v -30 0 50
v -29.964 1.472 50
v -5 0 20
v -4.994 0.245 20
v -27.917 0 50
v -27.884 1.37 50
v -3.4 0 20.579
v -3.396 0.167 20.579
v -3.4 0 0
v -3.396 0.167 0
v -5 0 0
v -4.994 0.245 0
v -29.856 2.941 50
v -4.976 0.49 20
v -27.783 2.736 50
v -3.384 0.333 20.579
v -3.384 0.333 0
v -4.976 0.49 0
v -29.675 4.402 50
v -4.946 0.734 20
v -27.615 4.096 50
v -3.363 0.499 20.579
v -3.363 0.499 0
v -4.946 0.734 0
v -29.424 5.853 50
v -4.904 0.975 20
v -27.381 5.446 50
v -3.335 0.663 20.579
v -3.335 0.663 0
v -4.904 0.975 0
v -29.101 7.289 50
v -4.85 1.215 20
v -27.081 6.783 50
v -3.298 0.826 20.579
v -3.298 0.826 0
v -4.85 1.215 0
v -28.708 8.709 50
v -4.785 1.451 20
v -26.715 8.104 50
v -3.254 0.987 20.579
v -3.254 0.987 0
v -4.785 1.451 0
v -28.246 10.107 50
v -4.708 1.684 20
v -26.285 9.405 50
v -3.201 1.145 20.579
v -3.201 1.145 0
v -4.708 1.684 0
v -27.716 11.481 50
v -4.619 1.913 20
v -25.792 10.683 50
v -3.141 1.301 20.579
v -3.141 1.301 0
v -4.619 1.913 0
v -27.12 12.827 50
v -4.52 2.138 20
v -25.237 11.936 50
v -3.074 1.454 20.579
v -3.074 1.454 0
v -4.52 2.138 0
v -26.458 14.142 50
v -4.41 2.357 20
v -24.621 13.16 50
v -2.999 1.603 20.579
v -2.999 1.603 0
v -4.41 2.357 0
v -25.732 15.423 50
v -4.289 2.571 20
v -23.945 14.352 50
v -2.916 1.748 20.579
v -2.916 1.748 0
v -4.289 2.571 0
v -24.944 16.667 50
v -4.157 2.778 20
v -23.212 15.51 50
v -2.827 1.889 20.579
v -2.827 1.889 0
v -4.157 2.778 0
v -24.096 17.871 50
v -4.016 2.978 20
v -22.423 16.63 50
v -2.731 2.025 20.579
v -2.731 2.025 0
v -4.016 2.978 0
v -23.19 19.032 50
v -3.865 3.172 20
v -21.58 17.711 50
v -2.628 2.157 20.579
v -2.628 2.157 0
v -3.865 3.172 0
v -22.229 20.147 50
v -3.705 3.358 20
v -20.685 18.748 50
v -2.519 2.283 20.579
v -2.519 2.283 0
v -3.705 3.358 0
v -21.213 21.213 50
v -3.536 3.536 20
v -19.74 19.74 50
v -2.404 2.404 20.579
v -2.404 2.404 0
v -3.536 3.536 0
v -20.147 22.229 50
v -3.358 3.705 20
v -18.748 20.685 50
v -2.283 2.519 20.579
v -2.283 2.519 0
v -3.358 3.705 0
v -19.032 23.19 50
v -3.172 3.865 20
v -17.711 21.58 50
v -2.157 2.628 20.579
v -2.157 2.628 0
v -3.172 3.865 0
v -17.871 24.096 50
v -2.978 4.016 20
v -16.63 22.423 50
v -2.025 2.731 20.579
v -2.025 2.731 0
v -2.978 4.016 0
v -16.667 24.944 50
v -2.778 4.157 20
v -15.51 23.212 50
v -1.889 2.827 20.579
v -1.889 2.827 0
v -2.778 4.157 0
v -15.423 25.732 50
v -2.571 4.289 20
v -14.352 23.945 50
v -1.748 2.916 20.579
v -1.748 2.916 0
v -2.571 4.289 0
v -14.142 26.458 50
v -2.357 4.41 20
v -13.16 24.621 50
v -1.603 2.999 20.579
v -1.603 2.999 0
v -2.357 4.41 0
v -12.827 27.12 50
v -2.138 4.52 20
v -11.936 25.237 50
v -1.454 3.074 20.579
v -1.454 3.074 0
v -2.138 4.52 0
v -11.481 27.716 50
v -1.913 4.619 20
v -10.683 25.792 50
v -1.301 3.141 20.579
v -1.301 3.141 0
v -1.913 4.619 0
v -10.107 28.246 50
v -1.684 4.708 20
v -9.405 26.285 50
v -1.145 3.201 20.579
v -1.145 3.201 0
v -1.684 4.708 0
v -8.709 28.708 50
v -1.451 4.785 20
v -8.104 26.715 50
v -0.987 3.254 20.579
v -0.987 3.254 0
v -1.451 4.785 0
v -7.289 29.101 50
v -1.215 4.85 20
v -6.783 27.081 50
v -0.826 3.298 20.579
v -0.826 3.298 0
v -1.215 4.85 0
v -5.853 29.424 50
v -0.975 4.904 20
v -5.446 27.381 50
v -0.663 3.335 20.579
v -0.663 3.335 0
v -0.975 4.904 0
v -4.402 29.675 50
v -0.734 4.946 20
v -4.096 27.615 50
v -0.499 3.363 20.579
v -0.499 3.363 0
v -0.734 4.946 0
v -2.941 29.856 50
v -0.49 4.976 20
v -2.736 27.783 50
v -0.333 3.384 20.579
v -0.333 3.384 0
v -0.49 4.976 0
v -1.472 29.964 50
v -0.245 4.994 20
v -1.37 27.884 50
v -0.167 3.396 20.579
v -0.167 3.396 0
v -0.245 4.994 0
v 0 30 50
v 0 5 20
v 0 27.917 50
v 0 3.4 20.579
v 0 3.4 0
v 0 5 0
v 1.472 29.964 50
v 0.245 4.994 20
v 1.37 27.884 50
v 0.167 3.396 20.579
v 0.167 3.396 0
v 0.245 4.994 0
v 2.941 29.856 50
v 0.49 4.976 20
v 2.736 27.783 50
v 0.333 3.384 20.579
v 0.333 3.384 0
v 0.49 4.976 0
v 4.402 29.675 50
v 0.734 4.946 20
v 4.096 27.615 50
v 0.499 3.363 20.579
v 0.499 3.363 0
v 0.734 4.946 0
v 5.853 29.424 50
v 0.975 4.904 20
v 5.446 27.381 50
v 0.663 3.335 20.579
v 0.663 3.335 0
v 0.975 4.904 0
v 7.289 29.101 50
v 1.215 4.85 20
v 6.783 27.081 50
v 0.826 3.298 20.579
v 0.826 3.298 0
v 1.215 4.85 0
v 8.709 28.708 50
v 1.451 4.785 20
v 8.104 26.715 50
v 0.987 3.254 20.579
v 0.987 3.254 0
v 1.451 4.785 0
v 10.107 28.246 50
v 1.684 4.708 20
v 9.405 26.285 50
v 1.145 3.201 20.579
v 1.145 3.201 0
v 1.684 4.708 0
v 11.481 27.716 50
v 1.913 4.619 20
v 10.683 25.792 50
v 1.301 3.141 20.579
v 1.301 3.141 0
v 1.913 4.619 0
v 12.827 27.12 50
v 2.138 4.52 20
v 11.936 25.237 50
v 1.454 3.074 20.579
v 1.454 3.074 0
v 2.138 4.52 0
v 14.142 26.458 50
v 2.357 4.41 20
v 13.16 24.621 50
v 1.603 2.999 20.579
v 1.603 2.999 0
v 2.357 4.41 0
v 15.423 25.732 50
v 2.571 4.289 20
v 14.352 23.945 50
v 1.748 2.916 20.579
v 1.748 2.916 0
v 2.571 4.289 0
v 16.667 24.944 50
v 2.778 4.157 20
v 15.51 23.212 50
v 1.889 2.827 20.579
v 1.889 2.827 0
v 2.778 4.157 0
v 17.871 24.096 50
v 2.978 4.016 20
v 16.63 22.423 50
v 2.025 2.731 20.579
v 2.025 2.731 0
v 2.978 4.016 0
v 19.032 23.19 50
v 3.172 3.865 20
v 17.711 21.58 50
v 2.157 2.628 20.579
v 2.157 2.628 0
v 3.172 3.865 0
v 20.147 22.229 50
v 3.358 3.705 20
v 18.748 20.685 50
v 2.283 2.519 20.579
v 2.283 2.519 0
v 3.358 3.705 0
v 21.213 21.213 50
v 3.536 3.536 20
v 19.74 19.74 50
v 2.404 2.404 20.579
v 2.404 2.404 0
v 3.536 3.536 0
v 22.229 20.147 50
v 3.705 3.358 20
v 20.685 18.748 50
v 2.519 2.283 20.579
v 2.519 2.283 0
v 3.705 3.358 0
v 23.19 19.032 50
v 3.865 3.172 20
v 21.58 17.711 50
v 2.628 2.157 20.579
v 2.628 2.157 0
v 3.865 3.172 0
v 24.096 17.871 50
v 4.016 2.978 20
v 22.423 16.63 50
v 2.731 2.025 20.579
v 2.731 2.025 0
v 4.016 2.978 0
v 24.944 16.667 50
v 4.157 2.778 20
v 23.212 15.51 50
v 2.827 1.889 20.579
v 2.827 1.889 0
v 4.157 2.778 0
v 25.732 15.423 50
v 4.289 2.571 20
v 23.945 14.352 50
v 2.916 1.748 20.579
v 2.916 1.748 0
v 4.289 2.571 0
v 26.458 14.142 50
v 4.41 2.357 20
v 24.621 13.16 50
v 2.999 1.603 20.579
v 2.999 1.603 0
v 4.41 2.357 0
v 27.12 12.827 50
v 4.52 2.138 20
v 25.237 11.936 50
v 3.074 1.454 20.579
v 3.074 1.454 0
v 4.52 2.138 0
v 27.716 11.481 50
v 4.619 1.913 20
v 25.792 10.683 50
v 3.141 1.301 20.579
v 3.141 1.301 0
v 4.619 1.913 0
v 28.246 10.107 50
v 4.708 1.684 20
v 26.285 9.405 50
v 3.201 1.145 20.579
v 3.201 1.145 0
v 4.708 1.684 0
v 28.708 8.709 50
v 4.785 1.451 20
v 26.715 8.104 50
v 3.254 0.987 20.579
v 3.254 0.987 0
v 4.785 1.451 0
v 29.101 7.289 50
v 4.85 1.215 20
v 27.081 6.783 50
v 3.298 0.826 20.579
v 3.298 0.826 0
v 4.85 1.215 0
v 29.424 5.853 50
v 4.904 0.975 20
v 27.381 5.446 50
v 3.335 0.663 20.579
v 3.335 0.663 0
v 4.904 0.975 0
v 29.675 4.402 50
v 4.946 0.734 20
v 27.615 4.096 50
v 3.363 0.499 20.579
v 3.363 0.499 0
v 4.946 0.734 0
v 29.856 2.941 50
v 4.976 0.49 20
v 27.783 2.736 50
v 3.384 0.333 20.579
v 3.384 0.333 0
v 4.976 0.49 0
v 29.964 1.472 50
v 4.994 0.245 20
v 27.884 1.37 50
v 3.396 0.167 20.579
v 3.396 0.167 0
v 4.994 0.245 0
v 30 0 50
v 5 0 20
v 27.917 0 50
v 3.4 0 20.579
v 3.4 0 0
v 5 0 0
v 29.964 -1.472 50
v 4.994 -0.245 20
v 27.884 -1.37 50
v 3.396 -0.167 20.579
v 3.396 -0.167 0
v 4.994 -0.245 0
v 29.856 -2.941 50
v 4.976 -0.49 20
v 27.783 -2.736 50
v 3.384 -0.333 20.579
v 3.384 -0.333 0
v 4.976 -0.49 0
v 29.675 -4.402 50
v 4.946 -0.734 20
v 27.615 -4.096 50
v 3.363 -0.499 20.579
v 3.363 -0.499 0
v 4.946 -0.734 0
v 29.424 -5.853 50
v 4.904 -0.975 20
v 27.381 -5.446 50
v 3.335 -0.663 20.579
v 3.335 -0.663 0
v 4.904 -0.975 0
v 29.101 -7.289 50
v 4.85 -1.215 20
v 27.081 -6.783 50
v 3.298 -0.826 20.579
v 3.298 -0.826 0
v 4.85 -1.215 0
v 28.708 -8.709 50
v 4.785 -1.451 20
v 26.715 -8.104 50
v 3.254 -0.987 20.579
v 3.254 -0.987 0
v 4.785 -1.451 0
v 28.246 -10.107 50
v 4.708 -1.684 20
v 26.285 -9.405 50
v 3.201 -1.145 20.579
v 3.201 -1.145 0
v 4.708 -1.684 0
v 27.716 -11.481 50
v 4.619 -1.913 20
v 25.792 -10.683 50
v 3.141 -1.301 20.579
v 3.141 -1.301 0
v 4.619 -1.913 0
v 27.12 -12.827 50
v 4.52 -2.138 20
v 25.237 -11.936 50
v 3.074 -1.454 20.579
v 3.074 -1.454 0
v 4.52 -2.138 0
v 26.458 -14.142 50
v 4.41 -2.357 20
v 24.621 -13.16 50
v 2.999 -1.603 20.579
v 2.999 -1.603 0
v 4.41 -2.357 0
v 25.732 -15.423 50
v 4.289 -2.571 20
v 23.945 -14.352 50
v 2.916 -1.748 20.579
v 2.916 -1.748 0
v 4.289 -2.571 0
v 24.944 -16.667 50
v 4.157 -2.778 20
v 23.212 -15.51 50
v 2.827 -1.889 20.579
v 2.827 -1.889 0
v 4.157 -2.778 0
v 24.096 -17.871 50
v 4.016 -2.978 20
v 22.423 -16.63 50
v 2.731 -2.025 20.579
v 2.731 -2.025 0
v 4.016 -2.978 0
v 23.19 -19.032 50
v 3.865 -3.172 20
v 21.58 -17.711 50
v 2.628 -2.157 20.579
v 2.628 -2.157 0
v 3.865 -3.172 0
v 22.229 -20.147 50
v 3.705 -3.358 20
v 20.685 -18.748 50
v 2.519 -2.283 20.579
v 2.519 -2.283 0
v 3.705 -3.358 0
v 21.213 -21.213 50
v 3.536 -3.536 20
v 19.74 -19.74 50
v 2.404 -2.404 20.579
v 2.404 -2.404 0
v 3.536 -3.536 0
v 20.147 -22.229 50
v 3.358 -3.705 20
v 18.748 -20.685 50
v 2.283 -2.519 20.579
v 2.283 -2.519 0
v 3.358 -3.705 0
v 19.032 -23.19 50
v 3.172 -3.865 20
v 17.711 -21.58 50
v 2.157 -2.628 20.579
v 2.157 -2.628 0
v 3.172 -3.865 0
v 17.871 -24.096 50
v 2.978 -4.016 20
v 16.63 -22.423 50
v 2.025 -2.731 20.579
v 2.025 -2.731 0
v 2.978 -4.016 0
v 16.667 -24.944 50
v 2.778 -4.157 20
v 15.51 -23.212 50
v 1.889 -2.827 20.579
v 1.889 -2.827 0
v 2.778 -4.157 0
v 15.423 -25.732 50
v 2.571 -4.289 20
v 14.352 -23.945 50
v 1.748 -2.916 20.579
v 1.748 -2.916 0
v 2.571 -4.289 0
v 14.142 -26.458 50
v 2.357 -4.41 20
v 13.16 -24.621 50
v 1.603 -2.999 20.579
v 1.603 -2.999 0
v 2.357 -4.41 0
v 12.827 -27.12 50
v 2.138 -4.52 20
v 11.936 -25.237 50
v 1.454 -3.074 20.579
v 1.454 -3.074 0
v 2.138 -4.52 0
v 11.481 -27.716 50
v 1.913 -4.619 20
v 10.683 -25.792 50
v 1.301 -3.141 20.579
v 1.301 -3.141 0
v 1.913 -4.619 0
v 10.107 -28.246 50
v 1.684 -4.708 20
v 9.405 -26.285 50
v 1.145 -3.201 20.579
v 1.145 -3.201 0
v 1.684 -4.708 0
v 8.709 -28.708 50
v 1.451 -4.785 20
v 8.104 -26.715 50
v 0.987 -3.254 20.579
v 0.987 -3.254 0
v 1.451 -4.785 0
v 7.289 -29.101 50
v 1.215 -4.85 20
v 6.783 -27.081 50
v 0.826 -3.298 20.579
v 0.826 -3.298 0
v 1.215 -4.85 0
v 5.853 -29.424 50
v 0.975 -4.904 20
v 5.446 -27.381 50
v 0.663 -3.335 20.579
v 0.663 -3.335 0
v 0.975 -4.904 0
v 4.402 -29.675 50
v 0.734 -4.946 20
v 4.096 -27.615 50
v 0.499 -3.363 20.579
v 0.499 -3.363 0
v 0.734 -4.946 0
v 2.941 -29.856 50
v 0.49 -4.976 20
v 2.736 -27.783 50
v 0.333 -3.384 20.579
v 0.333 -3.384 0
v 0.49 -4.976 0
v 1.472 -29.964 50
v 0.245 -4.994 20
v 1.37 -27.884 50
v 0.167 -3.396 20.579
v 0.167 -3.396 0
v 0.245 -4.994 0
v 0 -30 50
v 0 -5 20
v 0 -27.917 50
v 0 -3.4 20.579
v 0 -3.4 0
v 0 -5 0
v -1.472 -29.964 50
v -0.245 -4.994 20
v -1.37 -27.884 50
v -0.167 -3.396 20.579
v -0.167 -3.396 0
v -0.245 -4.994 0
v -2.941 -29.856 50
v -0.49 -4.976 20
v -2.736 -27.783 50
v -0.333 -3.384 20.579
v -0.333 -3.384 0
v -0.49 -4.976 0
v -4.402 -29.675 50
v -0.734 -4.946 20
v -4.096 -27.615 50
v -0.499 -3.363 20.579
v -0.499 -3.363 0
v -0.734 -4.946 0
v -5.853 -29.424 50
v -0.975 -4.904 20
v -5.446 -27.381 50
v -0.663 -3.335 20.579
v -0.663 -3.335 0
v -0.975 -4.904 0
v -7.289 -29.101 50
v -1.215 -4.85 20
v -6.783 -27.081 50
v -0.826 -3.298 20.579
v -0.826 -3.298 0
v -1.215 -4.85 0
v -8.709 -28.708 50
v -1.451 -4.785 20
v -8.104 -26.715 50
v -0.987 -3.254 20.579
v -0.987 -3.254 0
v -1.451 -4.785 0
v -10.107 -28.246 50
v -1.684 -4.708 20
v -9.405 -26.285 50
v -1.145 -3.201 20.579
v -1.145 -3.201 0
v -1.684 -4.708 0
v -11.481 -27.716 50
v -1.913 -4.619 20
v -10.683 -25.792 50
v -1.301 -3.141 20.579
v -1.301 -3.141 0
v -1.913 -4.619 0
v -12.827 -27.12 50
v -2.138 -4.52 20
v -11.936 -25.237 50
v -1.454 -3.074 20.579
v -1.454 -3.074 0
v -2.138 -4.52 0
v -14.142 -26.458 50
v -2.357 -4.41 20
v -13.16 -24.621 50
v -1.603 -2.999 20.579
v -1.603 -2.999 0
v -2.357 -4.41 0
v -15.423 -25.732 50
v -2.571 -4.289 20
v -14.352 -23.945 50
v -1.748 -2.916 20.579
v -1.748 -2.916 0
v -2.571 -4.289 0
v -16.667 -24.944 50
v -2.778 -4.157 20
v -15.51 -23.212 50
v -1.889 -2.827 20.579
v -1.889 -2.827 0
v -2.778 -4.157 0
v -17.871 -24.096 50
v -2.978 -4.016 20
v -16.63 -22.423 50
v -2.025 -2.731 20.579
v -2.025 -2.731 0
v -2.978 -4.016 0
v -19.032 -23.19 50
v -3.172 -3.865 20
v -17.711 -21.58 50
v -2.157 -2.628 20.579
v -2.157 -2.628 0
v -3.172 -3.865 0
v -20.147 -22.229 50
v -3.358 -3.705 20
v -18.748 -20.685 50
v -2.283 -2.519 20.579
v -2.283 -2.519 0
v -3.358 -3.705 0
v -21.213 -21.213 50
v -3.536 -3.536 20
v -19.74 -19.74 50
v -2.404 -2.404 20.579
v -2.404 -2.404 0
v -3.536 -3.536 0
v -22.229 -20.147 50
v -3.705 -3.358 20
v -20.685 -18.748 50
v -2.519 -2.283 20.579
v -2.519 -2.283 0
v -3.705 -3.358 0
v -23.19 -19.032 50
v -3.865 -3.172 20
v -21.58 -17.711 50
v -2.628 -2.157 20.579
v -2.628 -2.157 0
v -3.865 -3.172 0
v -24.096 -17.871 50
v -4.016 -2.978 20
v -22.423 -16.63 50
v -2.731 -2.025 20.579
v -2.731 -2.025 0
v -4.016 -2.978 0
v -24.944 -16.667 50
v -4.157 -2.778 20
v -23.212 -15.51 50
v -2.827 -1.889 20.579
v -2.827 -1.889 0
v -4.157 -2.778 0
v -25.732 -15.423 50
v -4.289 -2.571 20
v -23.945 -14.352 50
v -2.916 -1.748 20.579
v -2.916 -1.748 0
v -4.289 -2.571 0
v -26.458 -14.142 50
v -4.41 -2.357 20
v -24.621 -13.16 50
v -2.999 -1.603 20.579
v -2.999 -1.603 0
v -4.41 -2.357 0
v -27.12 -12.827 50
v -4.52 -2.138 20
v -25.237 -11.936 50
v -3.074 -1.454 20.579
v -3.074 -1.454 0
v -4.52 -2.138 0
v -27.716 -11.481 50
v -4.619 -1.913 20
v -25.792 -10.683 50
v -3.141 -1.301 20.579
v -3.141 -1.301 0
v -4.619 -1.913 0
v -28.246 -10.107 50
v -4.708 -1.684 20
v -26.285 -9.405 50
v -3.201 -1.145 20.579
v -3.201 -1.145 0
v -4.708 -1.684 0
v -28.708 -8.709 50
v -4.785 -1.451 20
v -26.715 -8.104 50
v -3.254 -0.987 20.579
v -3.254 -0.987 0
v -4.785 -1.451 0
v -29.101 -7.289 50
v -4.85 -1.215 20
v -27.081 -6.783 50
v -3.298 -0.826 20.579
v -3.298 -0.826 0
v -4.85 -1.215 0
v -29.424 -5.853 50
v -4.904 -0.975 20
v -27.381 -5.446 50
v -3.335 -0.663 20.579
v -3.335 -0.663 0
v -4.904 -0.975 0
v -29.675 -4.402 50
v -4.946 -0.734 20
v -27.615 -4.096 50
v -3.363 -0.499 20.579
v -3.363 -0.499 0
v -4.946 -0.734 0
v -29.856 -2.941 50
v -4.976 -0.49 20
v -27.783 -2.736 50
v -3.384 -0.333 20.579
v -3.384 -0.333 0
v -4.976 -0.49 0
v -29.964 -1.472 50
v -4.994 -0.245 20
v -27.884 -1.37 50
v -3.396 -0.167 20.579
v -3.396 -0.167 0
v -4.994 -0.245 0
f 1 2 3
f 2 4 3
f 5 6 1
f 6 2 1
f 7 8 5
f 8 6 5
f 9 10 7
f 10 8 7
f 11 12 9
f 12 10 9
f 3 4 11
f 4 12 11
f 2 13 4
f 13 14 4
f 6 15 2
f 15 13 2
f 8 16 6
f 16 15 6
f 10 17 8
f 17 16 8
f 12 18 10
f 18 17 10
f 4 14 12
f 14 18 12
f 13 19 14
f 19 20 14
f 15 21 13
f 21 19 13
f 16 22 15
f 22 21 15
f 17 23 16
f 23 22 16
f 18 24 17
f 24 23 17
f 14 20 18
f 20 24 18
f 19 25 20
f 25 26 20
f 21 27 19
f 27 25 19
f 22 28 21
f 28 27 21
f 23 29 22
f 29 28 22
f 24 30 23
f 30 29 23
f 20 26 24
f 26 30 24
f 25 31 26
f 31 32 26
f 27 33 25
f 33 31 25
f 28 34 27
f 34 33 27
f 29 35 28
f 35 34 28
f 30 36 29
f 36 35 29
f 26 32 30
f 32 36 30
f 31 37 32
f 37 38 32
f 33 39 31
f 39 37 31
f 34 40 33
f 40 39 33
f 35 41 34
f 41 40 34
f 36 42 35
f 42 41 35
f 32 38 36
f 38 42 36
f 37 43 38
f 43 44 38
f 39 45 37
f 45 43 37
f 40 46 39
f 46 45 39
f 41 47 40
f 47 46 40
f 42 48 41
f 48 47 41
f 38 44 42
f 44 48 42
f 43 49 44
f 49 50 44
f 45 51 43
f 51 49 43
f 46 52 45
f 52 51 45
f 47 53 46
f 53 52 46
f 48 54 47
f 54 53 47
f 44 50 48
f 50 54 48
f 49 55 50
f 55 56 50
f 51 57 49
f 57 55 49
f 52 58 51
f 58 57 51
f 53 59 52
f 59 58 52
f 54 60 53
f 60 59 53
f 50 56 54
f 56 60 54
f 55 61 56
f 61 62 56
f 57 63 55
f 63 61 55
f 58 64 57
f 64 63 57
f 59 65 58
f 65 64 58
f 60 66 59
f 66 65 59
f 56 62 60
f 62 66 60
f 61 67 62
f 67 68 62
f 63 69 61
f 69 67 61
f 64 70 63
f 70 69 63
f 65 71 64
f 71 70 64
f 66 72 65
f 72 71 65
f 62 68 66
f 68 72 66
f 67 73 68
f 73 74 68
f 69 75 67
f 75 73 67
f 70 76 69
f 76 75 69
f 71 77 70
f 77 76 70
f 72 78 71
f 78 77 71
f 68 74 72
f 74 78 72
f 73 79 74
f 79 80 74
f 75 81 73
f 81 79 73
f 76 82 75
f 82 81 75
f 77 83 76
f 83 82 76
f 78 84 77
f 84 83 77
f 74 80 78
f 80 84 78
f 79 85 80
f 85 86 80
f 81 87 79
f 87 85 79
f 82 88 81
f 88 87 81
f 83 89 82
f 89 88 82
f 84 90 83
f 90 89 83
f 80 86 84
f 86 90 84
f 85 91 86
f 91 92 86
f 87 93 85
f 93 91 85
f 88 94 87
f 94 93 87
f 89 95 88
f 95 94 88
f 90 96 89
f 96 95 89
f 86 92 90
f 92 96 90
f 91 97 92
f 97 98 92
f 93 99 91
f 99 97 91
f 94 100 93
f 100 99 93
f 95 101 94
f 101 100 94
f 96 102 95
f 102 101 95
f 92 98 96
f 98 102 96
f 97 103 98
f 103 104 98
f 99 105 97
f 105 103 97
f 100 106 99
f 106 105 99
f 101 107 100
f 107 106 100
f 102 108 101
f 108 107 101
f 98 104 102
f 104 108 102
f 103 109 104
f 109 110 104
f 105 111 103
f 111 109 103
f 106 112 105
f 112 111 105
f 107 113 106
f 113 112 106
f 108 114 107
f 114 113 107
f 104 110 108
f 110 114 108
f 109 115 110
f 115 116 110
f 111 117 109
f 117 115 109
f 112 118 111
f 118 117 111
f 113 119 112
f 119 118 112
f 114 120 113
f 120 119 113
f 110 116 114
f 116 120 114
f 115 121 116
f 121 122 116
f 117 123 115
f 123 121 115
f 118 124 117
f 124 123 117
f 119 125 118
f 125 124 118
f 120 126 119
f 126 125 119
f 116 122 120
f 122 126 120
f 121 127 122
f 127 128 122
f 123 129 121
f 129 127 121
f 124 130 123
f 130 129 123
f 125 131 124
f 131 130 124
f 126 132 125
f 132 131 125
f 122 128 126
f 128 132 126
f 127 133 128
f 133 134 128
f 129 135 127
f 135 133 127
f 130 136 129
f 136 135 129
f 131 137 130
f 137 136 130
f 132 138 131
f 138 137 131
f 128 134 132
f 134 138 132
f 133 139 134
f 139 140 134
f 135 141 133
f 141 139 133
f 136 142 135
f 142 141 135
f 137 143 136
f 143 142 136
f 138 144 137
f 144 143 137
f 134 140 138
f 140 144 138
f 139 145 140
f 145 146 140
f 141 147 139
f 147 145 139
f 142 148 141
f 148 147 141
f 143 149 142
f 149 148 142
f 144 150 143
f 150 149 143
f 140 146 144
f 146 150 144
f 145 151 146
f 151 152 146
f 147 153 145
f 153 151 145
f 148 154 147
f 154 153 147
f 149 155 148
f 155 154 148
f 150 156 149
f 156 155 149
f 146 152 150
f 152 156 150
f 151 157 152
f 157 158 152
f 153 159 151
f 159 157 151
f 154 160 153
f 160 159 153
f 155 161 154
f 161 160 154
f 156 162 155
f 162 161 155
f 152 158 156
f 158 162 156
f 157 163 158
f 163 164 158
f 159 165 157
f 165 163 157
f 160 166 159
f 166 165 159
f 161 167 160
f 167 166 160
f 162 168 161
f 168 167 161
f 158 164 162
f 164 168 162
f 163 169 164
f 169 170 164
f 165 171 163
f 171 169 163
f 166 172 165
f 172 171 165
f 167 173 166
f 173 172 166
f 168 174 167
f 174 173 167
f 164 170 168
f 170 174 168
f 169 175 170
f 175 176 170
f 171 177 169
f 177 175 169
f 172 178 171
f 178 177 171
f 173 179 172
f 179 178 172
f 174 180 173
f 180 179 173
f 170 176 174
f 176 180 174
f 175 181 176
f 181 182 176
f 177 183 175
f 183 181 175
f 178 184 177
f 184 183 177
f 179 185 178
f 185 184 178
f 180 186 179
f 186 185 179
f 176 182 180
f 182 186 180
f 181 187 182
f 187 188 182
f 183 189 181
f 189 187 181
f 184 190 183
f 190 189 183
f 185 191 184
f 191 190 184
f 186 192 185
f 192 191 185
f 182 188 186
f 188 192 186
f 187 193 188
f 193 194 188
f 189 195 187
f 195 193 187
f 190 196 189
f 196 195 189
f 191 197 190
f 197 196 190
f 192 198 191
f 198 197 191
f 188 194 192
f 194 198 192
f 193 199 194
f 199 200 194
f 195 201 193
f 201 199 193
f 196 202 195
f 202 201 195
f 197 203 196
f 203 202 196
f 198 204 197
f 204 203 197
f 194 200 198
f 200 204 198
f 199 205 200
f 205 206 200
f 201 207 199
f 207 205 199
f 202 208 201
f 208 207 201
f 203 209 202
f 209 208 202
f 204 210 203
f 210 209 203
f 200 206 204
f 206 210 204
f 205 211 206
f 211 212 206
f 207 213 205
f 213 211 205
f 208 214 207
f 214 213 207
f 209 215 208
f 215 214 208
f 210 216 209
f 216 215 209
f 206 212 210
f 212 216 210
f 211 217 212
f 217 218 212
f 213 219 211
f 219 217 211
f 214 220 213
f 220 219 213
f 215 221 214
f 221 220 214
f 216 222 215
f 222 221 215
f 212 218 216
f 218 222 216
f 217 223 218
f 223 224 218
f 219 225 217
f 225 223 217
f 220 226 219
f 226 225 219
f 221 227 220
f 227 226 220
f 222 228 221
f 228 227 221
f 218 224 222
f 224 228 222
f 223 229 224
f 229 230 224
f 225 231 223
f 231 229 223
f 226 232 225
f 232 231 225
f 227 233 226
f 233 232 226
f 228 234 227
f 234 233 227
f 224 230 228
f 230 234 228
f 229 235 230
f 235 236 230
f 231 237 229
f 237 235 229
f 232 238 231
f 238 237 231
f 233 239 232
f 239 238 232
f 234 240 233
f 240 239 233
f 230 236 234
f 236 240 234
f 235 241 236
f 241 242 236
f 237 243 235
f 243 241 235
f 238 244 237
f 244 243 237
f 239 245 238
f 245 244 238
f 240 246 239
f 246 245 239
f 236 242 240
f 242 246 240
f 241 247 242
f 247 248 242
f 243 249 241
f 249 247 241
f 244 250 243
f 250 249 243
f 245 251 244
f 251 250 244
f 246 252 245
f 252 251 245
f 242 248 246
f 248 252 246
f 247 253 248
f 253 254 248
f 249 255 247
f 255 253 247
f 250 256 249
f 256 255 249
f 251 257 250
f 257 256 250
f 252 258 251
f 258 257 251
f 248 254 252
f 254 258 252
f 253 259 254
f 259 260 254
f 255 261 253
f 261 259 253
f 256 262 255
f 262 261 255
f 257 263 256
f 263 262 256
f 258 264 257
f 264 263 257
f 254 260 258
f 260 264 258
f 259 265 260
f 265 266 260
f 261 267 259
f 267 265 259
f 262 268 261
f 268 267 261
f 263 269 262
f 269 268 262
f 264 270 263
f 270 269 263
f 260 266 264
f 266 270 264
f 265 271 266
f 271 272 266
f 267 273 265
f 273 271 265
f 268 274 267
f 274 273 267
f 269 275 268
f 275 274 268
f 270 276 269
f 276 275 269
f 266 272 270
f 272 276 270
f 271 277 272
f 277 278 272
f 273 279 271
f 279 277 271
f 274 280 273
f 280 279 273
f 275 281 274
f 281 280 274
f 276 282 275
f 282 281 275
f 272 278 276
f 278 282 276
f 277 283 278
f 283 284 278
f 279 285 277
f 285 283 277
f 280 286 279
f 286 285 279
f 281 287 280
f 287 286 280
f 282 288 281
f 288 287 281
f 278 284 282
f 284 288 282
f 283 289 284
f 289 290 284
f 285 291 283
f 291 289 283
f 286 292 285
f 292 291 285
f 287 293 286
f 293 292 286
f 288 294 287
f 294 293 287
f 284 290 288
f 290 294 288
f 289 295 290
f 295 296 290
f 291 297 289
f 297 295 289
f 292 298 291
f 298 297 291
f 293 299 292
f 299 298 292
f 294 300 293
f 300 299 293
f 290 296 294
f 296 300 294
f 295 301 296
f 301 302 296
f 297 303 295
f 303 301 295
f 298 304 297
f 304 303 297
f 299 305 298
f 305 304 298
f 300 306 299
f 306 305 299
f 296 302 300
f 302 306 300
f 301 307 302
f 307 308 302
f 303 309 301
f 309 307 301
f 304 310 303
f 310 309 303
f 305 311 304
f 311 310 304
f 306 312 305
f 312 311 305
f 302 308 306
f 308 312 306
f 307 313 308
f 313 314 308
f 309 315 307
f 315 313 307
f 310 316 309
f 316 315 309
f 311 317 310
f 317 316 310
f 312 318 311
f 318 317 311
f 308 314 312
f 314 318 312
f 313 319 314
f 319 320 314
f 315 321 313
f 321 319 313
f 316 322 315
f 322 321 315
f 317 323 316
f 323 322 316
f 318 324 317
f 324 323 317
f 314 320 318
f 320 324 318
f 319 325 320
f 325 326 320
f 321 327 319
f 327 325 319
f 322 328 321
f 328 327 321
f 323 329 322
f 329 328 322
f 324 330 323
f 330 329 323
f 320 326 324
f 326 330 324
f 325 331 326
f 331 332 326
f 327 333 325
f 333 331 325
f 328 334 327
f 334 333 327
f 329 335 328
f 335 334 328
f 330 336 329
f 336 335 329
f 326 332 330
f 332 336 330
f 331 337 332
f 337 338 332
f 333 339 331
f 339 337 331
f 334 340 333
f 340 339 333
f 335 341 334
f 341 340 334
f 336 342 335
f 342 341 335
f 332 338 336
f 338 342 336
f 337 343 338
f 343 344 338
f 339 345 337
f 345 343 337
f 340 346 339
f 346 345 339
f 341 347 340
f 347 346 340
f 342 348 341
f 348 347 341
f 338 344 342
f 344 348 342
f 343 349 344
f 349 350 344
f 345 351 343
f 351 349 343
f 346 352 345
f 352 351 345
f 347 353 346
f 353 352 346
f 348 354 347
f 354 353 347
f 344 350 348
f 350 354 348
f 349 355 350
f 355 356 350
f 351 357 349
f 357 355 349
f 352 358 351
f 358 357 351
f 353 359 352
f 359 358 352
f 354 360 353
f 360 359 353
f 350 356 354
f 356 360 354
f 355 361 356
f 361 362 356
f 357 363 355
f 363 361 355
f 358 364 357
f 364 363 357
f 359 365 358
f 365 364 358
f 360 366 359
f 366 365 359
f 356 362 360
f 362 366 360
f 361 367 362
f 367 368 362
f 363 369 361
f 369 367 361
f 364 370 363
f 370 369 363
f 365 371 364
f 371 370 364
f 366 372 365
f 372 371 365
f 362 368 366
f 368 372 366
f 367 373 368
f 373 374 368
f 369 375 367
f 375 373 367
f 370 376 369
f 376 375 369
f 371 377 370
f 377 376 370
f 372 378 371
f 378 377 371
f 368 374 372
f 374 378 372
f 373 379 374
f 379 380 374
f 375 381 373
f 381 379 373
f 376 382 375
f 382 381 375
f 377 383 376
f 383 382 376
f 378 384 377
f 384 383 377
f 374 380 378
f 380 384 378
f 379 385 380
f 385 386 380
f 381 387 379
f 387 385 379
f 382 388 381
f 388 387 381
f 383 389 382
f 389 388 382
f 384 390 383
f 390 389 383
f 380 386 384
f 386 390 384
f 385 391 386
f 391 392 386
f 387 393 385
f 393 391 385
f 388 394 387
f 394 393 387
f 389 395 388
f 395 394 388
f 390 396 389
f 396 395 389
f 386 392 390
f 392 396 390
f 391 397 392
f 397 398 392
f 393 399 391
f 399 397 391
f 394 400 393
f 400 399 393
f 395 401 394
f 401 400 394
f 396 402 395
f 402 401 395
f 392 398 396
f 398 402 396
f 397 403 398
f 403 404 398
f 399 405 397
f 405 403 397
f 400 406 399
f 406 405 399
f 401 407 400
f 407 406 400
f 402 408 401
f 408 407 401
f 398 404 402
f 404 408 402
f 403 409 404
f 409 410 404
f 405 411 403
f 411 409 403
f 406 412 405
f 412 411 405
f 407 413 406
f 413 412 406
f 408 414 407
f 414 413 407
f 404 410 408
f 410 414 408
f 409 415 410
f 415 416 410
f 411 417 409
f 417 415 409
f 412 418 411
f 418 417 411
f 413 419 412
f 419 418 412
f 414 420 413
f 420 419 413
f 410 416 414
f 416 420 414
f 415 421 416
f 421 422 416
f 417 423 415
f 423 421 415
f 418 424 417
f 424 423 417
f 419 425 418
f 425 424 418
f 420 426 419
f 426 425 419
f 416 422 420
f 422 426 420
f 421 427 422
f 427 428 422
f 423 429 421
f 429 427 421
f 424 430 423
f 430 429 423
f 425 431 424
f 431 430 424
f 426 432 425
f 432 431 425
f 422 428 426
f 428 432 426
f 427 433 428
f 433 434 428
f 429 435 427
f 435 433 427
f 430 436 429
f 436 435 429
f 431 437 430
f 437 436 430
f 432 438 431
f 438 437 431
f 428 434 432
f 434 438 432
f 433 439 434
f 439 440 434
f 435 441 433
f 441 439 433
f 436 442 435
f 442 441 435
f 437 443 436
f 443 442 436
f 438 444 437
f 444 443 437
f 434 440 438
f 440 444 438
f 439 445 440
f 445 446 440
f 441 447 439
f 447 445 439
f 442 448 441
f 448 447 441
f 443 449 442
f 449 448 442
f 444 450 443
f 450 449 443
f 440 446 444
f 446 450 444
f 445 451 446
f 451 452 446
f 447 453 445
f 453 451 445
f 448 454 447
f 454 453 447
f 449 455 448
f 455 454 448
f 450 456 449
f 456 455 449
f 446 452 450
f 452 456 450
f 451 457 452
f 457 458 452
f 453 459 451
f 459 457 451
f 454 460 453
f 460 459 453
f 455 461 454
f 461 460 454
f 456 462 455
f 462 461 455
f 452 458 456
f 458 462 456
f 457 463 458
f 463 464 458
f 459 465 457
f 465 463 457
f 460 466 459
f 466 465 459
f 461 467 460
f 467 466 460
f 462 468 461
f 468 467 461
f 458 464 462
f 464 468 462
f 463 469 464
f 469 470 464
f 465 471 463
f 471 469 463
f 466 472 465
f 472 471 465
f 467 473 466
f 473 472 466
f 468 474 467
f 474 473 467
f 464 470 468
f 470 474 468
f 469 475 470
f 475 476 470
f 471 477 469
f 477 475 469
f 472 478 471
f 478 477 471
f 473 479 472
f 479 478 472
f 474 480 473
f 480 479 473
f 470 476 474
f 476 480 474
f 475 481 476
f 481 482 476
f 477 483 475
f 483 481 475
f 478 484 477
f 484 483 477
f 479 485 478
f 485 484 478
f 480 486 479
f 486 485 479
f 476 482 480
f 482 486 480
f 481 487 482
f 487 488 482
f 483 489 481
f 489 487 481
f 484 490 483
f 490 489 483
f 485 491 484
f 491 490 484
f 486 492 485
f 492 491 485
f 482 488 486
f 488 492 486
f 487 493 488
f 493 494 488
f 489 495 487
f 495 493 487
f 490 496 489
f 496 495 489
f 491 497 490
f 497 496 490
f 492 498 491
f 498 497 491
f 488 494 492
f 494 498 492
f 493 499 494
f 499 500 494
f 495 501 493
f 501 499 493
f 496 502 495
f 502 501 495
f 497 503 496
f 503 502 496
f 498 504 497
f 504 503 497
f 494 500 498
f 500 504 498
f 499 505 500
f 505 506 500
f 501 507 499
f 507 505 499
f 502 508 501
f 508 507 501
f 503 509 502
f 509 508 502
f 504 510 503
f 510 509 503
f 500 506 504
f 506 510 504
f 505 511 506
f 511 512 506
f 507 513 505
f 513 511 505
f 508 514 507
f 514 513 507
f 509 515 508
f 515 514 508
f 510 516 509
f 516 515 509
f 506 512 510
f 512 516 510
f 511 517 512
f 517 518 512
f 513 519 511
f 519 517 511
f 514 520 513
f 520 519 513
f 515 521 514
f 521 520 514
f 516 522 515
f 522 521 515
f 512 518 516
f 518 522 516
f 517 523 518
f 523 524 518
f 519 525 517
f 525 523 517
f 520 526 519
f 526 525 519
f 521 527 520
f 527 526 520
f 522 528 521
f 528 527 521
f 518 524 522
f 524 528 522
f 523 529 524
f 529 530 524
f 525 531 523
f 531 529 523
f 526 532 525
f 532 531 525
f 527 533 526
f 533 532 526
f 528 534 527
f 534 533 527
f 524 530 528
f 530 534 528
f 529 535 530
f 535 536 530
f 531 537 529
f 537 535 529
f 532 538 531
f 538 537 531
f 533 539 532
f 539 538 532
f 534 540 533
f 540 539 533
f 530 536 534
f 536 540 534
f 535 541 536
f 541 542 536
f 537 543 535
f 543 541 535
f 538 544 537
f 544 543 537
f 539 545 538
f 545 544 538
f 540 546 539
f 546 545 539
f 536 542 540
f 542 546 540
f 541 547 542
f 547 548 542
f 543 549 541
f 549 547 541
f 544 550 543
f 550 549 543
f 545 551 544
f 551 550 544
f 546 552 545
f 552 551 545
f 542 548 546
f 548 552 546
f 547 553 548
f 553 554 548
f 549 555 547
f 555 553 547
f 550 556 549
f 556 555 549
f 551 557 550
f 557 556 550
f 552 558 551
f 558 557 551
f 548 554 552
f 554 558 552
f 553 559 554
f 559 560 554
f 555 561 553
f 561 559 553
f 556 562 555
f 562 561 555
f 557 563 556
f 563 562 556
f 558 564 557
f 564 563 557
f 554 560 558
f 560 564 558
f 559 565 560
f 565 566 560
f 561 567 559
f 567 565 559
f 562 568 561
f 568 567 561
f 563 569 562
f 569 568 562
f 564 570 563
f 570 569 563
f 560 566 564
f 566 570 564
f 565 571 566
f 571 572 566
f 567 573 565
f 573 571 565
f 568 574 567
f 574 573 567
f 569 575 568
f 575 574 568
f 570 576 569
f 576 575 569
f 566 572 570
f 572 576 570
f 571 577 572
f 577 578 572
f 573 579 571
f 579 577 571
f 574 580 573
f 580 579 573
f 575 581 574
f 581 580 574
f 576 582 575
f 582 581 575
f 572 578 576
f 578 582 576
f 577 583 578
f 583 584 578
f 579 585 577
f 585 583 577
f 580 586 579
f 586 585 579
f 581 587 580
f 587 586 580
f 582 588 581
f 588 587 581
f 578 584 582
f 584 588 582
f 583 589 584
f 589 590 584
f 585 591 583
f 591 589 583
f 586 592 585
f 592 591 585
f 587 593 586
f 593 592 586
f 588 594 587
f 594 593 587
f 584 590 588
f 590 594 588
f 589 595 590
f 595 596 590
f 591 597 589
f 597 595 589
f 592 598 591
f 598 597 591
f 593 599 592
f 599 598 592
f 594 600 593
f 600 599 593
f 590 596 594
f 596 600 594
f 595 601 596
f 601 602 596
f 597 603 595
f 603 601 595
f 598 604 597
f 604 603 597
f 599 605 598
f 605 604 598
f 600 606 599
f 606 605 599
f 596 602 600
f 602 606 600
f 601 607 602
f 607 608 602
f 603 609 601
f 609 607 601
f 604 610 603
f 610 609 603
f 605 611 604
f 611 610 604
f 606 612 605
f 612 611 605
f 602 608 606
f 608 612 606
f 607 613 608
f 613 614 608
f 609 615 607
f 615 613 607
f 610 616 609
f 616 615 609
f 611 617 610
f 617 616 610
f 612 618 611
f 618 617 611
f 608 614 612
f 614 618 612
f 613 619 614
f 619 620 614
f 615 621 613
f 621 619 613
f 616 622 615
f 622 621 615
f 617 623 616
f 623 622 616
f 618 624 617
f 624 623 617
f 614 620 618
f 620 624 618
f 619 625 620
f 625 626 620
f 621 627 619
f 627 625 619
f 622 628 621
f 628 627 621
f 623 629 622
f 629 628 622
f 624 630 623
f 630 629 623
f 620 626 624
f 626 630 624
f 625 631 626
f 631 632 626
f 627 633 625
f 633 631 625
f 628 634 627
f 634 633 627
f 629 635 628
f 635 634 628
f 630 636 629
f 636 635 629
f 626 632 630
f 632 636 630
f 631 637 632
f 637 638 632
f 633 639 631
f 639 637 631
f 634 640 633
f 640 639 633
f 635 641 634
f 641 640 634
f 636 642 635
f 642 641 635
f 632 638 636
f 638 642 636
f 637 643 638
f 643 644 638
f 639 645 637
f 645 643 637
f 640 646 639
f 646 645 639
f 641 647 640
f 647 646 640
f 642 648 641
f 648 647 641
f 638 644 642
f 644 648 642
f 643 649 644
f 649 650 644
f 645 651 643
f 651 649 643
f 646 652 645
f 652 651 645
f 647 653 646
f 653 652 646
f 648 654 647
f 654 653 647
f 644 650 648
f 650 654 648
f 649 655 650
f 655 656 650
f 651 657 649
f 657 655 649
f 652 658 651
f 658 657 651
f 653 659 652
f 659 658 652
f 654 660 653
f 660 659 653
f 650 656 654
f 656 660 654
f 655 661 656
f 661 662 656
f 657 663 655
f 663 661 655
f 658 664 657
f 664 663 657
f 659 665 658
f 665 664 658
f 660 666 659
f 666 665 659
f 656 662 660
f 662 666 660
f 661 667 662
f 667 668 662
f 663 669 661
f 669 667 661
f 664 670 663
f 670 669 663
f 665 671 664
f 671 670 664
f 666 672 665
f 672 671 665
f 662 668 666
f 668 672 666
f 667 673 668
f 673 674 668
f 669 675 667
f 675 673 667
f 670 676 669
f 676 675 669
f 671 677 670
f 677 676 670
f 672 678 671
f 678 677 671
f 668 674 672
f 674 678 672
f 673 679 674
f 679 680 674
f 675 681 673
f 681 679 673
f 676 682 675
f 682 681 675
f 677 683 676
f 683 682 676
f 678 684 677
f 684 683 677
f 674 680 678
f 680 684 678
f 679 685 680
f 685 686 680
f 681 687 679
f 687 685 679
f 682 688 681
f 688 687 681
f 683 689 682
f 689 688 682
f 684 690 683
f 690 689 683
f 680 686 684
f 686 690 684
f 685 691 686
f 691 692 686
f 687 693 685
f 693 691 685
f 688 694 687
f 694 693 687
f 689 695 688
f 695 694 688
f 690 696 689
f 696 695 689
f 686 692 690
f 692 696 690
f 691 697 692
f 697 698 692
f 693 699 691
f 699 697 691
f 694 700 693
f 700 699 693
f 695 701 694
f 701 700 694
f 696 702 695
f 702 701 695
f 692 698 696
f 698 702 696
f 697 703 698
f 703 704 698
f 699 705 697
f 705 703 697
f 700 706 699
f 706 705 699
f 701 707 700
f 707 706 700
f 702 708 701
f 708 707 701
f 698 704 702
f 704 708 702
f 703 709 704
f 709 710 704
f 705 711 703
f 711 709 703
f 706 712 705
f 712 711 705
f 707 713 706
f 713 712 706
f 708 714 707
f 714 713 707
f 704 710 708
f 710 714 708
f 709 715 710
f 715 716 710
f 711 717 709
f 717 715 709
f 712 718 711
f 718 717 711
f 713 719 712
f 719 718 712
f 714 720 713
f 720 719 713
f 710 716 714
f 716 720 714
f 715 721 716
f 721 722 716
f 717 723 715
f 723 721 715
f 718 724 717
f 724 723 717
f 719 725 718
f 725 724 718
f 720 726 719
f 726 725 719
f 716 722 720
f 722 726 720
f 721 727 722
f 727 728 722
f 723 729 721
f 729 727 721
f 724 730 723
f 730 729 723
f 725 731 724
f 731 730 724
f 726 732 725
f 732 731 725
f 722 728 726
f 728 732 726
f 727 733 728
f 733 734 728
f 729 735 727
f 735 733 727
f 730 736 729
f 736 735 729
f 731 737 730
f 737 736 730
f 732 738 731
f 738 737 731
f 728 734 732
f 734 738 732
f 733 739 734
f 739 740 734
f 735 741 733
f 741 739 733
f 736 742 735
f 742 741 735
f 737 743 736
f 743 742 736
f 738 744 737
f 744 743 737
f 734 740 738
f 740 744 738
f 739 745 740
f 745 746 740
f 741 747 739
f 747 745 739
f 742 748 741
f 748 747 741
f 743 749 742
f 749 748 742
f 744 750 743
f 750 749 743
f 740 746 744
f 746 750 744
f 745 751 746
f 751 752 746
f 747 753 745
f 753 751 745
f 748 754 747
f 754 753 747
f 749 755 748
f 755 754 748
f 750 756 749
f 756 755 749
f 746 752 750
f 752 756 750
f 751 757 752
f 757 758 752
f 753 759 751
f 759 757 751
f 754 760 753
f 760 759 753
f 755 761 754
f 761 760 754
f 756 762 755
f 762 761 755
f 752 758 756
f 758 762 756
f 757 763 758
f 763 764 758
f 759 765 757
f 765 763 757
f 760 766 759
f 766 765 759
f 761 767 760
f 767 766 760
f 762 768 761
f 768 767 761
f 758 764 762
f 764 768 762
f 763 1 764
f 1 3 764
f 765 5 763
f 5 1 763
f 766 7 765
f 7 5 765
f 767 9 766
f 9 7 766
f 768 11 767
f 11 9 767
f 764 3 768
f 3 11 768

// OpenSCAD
// Small lab funnel - printed upright, wide opening at top
// Built as a single rotate_extrude of a 2D wall profile (open top and bottom)

$fn = 128;

// ---------------- Dimensions (mm) ----------------
spout_od     = 10;    // spout outer diameter
spout_h      = 20;    // spout height (z = 0 .. 20)
rim_od       = 60;    // cone outer diameter at rim
rim_z        = 50;    // rim height (top of funnel)
wall         = 1.6;   // wall thickness (normal to surface)

// ---------------- Derived values ----------------
spout_r      = spout_od / 2;                // 5.0  outer spout radius
bore_r       = spout_r - wall;              // 3.4  spout bore radius (6.8 mm bore)
rim_r        = rim_od / 2;                  // 30.0 outer rim radius
cone_h       = rim_z - spout_h;             // 30.0 cone height
cone_k       = (rim_r - spout_r) / cone_h;  // radial growth per mm of height
// Horizontal offset that gives a true 1.6 mm wall perpendicular to the cone side
cone_off     = wall * sqrt(1 + cone_k * cone_k);
// Height where the inner cone surface meets the spout bore
join_z       = spout_h + (cone_off - wall) / cone_k;
rim_inner_r  = rim_r - cone_off;            // inner radius at the rim

// ---------------- Model ----------------
rotate_extrude(convexity = 4)
    polygon(points = [
        [bore_r,      0],        // bottom inner edge of spout
        [spout_r,     0],        // bottom outer edge of spout
        [spout_r,     spout_h],  // top of straight spout (outer)
        [rim_r,       rim_z],    // outer rim
        [rim_inner_r, rim_z],    // inner rim
        [bore_r,      join_z]    // inner cone meets spout bore
    ]);
